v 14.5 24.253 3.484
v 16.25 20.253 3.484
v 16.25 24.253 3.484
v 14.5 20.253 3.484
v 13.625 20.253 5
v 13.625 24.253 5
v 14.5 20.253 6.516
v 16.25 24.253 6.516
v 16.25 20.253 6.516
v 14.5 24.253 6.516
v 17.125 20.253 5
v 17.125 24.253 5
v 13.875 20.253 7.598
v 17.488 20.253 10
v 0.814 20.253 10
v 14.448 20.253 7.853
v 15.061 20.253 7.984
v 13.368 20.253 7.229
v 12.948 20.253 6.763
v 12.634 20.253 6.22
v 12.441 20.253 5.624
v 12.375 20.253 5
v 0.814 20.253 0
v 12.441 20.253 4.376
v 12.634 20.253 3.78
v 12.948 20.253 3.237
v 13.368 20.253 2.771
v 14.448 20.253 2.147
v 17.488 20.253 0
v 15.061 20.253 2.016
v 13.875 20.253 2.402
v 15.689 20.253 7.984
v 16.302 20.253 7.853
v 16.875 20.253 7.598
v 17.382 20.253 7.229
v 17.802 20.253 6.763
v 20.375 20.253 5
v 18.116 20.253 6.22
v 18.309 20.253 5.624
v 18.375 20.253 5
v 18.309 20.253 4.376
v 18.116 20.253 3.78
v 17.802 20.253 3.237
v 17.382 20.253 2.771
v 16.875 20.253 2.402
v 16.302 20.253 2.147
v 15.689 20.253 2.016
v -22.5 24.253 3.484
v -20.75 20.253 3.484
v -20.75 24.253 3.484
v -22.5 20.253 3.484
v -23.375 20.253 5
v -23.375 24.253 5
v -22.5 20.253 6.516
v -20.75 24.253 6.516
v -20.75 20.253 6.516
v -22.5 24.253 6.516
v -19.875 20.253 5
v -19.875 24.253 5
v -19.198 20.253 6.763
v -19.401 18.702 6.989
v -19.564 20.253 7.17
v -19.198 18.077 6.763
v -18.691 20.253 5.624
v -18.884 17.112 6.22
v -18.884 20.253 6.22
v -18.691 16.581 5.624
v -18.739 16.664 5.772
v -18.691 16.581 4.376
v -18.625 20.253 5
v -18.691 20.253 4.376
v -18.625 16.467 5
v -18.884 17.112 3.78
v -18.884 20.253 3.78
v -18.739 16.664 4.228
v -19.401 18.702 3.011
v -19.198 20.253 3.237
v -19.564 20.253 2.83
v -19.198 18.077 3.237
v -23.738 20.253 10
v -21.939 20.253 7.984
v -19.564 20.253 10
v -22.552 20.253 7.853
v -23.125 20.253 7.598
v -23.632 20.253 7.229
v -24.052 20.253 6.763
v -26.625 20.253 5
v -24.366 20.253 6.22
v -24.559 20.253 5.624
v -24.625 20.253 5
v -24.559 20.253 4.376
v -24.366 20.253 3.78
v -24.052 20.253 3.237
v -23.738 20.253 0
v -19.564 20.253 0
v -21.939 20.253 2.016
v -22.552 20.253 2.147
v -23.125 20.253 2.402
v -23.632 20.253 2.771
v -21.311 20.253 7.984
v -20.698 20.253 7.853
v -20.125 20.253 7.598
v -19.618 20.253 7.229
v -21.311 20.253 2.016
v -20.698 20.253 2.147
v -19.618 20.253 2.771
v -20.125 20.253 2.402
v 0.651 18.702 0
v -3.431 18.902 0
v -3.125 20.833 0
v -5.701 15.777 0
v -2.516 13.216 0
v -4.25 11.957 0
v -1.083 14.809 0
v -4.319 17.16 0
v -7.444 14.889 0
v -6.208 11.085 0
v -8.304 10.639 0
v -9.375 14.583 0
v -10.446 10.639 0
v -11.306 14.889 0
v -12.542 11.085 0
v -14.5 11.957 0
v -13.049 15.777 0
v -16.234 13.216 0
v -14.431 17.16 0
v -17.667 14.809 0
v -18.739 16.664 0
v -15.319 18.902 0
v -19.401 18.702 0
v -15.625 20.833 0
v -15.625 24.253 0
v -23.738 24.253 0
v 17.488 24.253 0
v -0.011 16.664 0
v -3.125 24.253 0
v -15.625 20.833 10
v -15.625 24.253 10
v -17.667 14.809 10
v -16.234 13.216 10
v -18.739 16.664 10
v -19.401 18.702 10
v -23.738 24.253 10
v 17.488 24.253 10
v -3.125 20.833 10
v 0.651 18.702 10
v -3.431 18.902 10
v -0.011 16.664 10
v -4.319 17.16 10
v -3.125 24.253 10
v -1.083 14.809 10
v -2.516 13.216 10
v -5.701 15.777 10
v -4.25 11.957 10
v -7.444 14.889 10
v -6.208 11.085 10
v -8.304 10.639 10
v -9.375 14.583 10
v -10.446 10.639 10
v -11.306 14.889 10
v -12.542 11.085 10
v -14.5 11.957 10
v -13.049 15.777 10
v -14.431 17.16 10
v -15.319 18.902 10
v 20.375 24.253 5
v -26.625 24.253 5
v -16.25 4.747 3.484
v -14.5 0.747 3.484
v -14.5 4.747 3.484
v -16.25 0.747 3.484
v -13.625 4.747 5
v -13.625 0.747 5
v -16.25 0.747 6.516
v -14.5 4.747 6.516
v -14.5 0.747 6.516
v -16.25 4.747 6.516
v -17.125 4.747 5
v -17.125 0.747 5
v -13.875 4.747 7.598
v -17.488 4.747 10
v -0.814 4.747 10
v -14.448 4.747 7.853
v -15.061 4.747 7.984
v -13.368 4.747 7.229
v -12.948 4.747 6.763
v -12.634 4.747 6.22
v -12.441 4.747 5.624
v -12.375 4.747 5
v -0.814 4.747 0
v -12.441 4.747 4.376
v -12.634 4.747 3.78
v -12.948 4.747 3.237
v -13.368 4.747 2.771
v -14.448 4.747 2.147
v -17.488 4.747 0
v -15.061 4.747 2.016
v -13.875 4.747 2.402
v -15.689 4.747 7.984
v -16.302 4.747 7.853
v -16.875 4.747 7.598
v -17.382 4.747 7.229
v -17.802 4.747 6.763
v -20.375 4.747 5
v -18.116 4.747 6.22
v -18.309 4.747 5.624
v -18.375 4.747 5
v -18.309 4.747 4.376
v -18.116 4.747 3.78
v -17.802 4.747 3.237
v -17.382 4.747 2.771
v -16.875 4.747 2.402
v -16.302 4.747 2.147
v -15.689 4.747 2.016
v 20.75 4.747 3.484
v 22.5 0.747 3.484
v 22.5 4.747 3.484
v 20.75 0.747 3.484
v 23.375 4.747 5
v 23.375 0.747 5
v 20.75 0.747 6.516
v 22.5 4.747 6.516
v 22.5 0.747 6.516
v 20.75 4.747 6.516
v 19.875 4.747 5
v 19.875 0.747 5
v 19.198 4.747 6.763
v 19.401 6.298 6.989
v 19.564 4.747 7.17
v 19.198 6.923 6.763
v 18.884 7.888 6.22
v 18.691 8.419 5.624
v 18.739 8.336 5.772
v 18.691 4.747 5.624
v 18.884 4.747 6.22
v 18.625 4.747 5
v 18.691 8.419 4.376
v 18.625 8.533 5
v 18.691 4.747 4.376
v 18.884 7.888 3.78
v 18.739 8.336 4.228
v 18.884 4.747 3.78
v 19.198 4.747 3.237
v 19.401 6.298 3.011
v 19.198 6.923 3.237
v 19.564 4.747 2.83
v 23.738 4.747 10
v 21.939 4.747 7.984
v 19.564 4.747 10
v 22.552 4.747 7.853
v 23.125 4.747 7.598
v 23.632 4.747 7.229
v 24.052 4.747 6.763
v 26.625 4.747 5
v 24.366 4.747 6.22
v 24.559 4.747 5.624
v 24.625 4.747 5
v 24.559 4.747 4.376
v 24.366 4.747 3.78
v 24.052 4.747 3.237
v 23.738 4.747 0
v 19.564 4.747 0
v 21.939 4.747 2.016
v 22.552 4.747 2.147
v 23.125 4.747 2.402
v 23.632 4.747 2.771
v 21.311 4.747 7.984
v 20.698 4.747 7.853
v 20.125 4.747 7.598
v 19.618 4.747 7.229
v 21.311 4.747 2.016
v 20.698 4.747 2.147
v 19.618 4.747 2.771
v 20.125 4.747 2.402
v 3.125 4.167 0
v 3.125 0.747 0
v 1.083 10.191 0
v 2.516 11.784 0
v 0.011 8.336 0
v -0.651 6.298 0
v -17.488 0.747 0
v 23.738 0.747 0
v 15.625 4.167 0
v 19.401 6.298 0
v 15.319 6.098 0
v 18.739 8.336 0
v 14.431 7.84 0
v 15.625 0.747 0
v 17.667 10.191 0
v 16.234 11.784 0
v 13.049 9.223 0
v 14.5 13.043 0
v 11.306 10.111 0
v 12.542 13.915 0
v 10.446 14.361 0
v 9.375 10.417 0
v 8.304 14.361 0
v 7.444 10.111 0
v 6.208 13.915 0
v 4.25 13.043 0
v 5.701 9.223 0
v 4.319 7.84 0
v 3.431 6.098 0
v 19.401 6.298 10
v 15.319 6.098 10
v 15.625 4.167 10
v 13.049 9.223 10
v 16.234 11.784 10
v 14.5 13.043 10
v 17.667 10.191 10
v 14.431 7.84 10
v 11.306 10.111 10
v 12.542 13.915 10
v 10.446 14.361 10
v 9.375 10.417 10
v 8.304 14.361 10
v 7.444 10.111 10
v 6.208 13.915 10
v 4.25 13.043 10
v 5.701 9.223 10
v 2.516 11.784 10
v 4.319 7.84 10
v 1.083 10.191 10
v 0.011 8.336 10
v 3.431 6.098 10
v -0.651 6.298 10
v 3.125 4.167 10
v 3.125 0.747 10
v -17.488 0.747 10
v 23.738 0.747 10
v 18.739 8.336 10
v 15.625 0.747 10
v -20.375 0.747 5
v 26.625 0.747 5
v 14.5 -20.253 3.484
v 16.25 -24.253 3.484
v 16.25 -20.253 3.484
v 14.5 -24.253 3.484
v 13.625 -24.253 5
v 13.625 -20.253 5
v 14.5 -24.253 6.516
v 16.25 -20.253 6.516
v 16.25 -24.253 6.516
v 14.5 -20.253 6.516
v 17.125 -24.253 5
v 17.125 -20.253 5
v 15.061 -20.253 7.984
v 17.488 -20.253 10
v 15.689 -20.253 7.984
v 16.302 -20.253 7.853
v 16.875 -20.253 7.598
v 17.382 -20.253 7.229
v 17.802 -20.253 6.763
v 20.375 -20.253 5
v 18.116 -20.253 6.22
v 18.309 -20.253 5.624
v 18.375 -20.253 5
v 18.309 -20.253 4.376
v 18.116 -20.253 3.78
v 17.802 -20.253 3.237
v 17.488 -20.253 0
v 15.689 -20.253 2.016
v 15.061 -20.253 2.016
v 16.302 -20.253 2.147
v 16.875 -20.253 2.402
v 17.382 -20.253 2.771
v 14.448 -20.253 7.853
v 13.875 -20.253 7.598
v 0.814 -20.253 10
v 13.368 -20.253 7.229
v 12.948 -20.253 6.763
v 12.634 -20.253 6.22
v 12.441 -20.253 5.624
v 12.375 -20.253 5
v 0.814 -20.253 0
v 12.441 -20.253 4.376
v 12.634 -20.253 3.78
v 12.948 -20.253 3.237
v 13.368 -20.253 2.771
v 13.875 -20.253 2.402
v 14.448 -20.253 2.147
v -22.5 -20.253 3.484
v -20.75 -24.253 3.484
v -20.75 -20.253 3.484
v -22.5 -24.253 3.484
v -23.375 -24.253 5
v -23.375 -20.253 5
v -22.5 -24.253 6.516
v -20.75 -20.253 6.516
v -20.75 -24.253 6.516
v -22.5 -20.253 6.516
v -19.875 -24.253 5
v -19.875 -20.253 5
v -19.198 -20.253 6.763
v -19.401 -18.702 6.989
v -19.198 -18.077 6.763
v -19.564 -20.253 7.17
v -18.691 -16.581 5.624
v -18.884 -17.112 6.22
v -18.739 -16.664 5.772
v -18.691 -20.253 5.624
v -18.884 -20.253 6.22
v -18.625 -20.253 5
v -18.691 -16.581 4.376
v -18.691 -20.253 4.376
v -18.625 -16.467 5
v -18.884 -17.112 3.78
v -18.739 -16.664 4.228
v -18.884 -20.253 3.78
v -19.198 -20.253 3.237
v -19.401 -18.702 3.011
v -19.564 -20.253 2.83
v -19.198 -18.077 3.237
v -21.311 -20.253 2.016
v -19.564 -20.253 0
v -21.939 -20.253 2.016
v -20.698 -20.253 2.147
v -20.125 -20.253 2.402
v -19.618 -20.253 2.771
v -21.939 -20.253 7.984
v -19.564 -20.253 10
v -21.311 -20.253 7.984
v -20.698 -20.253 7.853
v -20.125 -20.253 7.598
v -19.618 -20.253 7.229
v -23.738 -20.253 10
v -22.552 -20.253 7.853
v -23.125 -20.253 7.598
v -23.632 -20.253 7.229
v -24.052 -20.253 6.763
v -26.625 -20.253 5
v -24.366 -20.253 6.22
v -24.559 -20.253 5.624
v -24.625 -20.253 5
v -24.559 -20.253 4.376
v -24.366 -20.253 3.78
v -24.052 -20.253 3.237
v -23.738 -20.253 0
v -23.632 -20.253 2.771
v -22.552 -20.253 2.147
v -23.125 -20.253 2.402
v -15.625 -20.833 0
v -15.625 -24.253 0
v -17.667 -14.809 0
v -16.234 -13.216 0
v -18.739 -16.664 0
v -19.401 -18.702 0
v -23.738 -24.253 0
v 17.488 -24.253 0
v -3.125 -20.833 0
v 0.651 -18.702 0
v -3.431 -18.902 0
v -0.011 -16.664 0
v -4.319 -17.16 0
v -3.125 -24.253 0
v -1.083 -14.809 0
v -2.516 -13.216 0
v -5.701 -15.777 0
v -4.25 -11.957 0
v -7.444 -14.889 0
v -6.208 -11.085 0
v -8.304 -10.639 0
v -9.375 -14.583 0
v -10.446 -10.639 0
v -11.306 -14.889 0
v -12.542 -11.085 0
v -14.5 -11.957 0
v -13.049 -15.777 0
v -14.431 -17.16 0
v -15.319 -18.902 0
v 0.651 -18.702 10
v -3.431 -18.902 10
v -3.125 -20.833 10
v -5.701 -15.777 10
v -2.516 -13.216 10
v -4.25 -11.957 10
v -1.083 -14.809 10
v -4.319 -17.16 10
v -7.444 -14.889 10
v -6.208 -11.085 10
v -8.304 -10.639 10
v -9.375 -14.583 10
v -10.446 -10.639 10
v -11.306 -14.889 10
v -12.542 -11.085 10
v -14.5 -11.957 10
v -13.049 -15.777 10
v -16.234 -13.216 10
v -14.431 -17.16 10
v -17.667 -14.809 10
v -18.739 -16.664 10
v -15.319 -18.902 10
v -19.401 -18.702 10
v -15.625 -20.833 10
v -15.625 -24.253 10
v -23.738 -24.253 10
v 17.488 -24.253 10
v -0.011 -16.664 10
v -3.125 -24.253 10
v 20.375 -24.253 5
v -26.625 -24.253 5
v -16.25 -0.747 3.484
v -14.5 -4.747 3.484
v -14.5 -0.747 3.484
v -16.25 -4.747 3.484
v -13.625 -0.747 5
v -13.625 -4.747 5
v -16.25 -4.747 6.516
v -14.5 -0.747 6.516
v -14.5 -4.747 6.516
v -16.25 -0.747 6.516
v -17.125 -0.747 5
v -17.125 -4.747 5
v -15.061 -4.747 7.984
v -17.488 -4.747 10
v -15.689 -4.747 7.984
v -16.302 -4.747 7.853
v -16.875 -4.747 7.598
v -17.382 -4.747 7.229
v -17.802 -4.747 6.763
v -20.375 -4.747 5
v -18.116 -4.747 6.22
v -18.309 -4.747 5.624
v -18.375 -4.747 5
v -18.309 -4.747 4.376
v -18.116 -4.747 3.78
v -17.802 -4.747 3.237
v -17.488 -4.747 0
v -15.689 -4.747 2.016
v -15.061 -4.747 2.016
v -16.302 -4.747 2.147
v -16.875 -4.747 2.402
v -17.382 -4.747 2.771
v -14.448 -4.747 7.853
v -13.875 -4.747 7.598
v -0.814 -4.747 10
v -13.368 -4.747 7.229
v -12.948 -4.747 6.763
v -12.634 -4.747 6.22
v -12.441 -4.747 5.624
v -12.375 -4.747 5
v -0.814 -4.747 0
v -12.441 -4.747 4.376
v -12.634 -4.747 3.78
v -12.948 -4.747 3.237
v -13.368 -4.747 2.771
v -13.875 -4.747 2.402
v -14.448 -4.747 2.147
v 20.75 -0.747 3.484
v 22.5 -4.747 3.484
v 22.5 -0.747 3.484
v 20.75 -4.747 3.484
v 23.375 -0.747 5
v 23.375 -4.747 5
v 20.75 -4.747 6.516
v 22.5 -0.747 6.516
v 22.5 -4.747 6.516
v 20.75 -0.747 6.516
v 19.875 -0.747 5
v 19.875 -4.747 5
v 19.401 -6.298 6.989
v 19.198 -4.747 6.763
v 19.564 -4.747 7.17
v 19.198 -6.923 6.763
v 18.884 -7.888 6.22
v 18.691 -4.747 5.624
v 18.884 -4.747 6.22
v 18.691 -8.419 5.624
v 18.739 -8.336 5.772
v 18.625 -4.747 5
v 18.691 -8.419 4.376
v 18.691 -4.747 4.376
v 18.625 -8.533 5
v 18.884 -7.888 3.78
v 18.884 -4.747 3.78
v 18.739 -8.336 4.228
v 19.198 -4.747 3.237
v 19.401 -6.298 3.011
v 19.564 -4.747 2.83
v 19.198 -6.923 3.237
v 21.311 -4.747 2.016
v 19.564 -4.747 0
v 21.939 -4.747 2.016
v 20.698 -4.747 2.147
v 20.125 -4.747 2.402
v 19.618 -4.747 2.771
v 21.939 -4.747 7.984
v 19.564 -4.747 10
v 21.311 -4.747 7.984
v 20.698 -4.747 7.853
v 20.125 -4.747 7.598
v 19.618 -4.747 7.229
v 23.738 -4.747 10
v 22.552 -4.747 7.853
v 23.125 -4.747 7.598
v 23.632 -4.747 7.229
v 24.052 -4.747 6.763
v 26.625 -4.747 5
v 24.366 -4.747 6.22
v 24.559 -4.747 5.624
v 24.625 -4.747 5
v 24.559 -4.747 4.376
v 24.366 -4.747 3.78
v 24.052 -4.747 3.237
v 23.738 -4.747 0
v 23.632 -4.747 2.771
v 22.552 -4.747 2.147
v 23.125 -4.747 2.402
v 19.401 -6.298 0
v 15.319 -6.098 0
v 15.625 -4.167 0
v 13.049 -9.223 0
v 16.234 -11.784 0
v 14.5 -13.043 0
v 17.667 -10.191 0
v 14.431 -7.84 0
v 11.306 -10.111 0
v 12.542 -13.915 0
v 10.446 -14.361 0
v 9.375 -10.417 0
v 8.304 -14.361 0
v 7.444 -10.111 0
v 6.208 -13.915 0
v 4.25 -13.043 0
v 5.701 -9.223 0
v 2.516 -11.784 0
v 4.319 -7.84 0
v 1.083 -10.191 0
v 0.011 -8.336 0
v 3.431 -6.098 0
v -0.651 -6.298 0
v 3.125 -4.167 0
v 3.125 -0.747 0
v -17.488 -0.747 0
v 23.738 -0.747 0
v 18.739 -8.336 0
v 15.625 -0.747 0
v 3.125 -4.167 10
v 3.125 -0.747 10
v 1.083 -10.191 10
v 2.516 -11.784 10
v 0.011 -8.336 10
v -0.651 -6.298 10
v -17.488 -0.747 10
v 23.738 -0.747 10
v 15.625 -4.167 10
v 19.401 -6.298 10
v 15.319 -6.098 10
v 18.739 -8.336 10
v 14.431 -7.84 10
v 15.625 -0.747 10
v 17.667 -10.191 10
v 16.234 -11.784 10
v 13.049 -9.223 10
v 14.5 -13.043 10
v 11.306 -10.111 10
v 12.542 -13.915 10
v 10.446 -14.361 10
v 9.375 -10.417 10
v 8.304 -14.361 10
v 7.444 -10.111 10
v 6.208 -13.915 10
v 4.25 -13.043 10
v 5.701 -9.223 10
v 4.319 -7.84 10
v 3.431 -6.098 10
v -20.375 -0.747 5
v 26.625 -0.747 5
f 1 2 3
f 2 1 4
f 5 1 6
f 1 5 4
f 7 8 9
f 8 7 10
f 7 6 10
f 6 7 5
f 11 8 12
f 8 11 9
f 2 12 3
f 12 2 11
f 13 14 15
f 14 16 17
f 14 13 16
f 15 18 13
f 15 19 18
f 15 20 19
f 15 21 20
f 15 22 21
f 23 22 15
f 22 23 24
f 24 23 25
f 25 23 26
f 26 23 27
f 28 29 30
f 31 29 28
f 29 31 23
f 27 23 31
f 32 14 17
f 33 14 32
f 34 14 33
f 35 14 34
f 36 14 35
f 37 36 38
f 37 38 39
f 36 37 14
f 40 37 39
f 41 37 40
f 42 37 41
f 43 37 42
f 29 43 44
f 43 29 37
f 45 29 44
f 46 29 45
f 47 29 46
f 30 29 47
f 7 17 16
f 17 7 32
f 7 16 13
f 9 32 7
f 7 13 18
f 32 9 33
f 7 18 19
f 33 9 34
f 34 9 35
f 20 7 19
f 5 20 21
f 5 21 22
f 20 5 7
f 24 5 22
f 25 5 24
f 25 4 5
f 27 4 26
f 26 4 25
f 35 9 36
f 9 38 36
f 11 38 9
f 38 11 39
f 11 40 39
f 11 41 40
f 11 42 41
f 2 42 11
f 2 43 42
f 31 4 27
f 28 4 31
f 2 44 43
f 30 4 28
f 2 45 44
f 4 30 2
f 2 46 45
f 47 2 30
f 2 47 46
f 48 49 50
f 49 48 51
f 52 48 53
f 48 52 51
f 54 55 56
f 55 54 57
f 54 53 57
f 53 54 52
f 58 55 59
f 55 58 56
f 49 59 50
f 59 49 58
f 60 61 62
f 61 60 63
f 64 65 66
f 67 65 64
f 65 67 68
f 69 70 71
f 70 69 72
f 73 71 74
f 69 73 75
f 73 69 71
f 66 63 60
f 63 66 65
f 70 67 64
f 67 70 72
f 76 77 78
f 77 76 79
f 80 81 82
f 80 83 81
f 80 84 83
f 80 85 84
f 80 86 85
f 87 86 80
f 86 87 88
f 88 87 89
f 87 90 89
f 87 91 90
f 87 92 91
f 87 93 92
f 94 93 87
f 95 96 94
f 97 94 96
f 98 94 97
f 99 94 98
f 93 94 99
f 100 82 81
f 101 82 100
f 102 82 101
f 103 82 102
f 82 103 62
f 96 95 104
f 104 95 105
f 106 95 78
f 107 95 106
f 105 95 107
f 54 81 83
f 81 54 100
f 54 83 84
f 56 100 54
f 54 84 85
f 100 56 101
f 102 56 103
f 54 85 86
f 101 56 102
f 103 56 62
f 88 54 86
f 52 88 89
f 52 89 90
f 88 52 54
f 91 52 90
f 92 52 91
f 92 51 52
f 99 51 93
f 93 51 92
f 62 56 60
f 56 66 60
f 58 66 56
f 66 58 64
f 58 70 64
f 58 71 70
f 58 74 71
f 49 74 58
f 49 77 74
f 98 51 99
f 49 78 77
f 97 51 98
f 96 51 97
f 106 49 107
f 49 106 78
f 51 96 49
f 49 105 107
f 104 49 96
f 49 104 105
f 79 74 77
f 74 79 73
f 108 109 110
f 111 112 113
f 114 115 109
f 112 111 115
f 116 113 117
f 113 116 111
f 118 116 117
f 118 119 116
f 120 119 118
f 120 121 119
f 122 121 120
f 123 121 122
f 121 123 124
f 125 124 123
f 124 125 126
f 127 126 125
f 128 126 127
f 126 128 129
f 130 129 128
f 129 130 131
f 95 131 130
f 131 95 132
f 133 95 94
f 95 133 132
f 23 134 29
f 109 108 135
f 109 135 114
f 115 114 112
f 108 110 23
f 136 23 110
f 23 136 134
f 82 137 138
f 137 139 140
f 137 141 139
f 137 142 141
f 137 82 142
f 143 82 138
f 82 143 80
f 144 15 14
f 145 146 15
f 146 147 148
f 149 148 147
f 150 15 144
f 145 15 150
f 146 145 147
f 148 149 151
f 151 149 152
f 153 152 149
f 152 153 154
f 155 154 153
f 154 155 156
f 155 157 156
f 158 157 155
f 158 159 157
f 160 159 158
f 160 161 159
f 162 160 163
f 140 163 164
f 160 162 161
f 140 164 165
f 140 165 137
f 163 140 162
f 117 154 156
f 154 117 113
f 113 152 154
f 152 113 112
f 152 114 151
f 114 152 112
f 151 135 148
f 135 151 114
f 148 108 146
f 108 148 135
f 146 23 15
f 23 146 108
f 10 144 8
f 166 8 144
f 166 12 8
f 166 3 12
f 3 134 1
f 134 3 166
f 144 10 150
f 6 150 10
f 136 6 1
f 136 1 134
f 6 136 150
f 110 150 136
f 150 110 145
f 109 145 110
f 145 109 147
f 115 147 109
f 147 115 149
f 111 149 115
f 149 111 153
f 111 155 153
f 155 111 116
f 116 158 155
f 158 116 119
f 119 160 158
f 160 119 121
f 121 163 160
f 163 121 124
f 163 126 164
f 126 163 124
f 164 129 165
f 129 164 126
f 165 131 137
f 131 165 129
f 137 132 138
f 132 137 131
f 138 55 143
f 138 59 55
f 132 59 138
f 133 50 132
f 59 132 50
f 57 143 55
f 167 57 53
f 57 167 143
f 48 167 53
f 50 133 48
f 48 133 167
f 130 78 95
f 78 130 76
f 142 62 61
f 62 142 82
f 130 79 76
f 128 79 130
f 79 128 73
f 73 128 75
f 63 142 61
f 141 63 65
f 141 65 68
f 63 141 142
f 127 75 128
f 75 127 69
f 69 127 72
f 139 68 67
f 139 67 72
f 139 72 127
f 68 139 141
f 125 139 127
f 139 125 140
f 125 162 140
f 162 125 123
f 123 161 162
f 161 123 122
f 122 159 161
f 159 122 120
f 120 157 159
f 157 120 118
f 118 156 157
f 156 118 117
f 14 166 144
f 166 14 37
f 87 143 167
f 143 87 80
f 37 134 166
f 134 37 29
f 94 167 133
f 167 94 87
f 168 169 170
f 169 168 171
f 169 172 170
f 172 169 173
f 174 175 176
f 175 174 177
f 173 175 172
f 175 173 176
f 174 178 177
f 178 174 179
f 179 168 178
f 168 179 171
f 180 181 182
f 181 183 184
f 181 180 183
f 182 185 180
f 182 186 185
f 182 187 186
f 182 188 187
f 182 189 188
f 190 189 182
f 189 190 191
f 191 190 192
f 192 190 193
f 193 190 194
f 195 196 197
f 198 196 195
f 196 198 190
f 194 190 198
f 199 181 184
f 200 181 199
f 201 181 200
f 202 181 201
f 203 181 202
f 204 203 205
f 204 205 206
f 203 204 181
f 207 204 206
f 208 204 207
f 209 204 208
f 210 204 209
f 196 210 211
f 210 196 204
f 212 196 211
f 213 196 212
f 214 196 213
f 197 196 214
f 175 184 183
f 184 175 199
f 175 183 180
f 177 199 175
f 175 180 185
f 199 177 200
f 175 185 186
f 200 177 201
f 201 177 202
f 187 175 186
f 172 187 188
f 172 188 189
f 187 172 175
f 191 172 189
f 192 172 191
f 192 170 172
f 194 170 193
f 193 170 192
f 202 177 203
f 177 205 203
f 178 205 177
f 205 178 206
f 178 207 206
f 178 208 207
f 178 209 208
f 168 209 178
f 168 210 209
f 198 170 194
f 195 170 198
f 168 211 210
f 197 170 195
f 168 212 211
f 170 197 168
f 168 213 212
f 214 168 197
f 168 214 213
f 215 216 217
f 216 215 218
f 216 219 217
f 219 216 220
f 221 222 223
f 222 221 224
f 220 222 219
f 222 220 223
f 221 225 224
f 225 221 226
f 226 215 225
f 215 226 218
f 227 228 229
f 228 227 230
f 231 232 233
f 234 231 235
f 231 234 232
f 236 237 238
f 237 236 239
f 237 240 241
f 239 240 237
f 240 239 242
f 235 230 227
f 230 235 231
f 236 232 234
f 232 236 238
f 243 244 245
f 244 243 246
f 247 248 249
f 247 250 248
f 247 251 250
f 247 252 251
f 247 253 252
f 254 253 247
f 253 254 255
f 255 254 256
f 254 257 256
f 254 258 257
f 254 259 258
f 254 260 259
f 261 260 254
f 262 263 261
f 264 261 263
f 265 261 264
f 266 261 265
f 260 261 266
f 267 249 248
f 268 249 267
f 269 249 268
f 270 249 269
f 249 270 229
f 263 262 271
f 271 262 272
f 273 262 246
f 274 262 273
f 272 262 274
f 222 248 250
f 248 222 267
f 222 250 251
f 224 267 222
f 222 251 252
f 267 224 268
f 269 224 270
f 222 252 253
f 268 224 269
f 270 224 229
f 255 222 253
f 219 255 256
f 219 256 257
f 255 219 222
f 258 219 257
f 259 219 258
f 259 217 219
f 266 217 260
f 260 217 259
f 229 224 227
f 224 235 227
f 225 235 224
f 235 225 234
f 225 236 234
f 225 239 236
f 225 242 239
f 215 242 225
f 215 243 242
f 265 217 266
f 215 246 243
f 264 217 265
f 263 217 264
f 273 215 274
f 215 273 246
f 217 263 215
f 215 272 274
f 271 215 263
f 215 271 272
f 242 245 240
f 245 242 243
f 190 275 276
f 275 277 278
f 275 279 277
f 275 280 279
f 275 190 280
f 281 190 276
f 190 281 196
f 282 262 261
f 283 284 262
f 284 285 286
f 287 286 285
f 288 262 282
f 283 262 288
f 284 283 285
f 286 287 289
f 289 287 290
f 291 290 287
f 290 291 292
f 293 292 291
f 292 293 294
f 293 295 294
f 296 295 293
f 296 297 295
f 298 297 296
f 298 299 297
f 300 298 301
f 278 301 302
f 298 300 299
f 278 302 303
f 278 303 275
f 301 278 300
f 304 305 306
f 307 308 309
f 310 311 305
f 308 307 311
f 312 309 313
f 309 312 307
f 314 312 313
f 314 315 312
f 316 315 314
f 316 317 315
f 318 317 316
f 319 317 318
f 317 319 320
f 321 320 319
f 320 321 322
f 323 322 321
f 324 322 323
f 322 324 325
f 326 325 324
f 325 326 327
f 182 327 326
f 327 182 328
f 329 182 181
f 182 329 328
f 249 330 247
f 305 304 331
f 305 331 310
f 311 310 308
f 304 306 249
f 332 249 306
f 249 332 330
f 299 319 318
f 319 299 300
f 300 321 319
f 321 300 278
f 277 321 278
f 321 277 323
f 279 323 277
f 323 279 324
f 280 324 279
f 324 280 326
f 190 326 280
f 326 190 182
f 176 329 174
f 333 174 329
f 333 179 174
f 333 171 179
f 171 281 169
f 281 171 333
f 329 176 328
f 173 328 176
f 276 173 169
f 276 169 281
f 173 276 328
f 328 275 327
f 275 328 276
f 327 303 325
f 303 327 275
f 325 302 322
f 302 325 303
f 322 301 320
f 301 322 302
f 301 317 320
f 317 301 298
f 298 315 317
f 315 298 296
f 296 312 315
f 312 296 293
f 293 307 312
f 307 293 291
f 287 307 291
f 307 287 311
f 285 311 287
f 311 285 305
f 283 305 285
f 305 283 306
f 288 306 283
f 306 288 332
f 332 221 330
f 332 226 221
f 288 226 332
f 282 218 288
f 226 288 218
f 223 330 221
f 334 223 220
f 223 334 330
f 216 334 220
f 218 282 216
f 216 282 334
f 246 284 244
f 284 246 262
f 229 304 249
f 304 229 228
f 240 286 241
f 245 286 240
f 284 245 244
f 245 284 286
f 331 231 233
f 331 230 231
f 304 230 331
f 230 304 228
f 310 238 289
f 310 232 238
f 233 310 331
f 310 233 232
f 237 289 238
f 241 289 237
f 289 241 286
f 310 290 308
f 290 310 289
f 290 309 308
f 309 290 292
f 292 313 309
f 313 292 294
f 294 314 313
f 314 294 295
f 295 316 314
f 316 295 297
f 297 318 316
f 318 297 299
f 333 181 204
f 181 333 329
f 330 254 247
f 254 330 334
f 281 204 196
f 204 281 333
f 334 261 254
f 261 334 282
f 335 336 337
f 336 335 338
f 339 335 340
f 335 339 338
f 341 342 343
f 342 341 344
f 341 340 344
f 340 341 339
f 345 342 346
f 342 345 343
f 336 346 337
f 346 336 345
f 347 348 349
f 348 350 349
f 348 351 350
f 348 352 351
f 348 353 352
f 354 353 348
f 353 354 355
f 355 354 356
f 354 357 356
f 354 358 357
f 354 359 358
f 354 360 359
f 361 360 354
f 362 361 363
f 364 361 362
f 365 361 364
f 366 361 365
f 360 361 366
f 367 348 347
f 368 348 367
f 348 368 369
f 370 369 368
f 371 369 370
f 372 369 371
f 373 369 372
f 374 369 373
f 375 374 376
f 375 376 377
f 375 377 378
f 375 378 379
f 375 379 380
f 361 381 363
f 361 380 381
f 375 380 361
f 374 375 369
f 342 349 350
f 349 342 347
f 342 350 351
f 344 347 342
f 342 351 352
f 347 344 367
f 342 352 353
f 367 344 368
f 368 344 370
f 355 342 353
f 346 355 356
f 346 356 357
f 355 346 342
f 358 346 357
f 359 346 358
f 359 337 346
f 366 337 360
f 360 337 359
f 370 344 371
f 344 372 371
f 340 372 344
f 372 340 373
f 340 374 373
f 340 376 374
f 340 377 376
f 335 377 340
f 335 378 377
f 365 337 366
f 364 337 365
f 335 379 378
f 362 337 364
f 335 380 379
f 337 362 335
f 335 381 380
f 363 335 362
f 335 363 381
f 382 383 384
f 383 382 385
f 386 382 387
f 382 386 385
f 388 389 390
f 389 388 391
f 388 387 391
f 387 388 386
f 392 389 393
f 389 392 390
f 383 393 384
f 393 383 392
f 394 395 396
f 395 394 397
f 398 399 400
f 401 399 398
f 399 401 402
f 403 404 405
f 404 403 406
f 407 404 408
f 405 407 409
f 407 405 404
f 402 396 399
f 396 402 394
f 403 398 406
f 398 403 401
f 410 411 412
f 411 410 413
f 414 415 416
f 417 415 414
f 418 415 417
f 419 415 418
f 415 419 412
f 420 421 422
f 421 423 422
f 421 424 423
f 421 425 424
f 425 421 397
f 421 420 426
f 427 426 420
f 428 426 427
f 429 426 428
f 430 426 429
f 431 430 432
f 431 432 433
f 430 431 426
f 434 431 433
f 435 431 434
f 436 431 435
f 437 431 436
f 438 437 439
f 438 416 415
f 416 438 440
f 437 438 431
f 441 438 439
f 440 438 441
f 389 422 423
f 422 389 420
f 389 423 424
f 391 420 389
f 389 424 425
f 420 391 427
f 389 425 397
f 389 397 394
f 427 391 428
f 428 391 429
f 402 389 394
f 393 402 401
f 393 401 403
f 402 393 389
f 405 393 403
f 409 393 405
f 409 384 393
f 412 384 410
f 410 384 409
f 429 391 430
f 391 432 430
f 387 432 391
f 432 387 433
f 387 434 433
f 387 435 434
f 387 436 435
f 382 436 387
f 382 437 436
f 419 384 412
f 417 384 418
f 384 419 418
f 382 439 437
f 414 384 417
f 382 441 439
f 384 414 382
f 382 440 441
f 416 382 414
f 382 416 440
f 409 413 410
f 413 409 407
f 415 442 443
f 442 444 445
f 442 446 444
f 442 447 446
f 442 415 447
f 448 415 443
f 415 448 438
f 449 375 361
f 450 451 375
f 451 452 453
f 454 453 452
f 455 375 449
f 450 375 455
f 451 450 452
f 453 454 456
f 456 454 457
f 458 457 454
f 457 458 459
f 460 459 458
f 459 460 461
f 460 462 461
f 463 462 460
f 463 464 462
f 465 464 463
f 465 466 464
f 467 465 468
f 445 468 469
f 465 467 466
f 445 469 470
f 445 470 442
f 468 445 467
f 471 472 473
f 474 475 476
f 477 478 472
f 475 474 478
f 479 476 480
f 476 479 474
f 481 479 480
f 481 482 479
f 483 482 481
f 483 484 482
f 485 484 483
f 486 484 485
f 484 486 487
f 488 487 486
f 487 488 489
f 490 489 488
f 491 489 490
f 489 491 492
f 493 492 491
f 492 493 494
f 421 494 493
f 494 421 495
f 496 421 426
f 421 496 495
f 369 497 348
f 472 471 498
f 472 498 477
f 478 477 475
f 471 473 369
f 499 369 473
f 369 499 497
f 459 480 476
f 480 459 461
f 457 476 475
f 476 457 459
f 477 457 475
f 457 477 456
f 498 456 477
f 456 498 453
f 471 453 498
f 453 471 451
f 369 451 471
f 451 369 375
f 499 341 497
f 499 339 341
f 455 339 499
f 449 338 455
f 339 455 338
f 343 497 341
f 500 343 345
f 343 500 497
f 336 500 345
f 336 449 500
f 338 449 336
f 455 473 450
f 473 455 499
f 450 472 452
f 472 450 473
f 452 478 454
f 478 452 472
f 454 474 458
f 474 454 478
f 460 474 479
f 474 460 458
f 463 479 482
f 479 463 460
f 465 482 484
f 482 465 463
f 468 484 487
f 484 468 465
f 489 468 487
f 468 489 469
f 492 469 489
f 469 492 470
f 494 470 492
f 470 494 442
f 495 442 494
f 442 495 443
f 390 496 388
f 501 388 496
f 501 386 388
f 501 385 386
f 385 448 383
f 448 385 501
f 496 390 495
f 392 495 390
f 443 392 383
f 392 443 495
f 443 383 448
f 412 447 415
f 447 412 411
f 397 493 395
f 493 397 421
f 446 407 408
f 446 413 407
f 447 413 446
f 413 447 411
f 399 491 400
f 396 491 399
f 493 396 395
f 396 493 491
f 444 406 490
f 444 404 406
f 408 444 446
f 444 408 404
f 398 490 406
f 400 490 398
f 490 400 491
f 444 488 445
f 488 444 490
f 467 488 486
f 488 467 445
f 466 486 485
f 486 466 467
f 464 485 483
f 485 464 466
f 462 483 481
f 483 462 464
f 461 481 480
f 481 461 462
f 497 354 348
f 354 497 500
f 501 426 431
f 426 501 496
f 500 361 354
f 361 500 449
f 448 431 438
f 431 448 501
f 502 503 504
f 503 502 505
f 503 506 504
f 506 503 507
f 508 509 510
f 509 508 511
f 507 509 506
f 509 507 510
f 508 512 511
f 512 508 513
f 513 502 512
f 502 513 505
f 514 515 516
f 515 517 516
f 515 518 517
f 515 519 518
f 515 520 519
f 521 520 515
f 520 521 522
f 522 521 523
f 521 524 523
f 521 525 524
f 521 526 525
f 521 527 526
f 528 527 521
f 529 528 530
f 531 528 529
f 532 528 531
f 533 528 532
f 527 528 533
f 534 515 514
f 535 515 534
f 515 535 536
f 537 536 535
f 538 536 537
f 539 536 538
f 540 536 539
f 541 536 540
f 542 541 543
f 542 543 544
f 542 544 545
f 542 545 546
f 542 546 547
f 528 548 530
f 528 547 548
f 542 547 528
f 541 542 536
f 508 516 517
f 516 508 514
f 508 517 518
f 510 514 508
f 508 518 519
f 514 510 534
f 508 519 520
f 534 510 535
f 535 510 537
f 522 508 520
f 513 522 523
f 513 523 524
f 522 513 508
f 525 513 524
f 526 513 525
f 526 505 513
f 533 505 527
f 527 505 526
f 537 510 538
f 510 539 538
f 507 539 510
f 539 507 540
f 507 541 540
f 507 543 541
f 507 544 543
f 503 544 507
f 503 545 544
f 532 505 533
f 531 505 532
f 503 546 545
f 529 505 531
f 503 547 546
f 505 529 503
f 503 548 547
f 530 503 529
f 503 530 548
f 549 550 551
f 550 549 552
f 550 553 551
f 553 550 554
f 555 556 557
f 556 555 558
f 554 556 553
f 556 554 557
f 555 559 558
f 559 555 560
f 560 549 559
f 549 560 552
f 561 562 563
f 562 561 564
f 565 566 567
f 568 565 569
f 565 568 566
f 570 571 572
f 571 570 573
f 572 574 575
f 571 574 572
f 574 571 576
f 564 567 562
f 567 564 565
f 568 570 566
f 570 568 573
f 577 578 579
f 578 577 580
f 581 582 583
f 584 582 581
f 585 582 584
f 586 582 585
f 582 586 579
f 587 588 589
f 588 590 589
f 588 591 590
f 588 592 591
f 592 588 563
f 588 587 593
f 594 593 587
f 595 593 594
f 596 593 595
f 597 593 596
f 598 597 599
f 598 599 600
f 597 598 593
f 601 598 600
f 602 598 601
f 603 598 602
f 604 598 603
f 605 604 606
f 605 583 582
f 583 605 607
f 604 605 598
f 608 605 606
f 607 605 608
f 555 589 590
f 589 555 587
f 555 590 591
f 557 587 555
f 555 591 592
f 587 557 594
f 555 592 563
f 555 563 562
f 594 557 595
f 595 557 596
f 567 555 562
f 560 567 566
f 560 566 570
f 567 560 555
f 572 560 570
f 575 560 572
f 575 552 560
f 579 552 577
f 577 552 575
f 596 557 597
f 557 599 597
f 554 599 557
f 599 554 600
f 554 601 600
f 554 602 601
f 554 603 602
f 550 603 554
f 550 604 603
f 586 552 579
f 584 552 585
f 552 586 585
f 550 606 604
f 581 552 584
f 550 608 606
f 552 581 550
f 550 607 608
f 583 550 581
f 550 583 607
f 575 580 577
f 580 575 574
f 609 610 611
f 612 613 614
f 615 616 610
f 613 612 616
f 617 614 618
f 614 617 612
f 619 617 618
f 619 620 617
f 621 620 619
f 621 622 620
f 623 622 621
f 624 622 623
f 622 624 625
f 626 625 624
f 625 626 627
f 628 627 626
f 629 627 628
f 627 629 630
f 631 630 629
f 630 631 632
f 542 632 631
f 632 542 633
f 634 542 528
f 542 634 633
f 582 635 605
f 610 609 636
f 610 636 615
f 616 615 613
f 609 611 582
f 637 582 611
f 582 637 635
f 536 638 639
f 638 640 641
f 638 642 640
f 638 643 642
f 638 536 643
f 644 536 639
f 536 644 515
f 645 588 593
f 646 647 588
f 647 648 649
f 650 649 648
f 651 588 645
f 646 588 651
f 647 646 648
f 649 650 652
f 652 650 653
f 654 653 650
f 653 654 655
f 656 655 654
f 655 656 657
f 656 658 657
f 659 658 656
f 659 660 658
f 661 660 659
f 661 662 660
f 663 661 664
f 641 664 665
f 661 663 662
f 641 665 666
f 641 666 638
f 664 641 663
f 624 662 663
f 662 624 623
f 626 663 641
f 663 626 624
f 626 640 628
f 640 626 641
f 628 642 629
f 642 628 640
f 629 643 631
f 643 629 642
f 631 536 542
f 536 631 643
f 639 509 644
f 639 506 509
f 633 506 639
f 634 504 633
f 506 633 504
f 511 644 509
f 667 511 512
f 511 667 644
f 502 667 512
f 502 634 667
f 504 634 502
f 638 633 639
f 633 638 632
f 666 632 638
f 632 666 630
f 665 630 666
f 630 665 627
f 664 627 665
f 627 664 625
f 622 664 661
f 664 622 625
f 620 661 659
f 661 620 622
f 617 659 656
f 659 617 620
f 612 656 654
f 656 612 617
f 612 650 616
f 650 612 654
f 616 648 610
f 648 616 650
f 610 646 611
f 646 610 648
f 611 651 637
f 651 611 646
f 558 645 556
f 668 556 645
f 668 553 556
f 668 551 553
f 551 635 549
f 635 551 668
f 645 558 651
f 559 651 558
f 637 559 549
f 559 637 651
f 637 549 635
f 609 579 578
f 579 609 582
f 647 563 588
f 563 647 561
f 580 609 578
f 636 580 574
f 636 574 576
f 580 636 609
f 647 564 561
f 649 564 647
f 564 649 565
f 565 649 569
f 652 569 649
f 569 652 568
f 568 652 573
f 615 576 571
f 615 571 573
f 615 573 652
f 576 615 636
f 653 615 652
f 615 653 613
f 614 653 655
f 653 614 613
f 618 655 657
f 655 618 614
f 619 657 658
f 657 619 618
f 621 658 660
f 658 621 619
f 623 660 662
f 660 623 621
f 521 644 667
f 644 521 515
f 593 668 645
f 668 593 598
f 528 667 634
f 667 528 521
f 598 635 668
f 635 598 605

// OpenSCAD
// file: configuration.scad
// default configuration
// m6 rods and nema14 motors

rod_size = 6;
rod_nut_size = 12; //12 for M6, 16 for M8
bearing_size = 12.5; //12 for LM6UU, 15 for LM8UU,LM8SUU
bearing_length = 20; //19 for LM6UU, 17 for LM8SUU, 24 for LM8UU
yz_motor_distance = 25;
motor_screw_spacing = 26; //26 for NEMA14, 31 for NEMA17
motor_casing = 38; //38 for NEMA14, 45 for NEMA17
end_height = 40;
bed_mount_height = 16;
//x_rod_spacing = motor_screw_spacing + 3 + rod_size;
x_rod_spacing = 30;
x_carriage_width = 70;
carriage_extruder_offset = 5;
pulley_size = 20;
idler_pulley_width = 10;
gusset_size = 15;
// main file
// y bearing retainer

include <configuration.scad>

module y_bearing_retainer() intersection() {
	difference() {
		linear_extrude(height = 10, convexity = 5) difference() {
			union() {
				intersection() {
					translate([-yz_motor_distance / 2 + bearing_size / 2, 0, 0]) circle(bearing_size / 2 + 4);
					translate([-yz_motor_distance / 2 + bearing_size / 2 - bearing_size / 2 - 4, -bearing_size, 0]) square([bearing_size + 8, bearing_size]);
				}
				translate([-yz_motor_distance / 2 + bearing_size / 2 - bearing_size / 2 - 4, 0, 0]) square([bearing_size + 8, bearing_size * sqrt(2) / 4 - 1]);
				translate([0, bearing_size * sqrt(2) / 4 - 3, 0]) square([yz_motor_distance + motor_casing - motor_screw_spacing + 10, 4], center = true);
			}
			translate([-yz_motor_distance / 2 + bearing_size / 2, 0, 0]) circle(bearing_size / 2);
			translate([-yz_motor_distance / 2 + bearing_size / 2 - bearing_size / 2, 0, 0]) square(bearing_size);
		}
		for(side = [1, -1]) translate([side * (yz_motor_distance + motor_casing - motor_screw_spacing) / 2, 0, 5]) rotate(90) rotate([90, 0, 90]) {
			cylinder(r = 3 * 7/12, h = bearing_size, center = true, $fn = 6);
			translate([0, 0, bearing_size * sqrt(2) / 4 - 5]) rotate([180, 0, 0]) cylinder(r = 3, h = bearing_size, $fn = 30);
		}
	}
	translate([0, 0, 5]) rotate(90) rotate([90, 0, 90]) cylinder(r = (yz_motor_distance + motor_casing - motor_screw_spacing + 10) / 2, h = bearing_size + 10, center = true, $fn = 6);
}

for(b = [0:1]) mirror([0, b, 0]) for(a = [-1,1]) translate([a * bearing_size / 4, bearing_size - (bearing_size * 2/3) * a, 0]) rotate(90 + 90 * a) y_bearing_retainer();
